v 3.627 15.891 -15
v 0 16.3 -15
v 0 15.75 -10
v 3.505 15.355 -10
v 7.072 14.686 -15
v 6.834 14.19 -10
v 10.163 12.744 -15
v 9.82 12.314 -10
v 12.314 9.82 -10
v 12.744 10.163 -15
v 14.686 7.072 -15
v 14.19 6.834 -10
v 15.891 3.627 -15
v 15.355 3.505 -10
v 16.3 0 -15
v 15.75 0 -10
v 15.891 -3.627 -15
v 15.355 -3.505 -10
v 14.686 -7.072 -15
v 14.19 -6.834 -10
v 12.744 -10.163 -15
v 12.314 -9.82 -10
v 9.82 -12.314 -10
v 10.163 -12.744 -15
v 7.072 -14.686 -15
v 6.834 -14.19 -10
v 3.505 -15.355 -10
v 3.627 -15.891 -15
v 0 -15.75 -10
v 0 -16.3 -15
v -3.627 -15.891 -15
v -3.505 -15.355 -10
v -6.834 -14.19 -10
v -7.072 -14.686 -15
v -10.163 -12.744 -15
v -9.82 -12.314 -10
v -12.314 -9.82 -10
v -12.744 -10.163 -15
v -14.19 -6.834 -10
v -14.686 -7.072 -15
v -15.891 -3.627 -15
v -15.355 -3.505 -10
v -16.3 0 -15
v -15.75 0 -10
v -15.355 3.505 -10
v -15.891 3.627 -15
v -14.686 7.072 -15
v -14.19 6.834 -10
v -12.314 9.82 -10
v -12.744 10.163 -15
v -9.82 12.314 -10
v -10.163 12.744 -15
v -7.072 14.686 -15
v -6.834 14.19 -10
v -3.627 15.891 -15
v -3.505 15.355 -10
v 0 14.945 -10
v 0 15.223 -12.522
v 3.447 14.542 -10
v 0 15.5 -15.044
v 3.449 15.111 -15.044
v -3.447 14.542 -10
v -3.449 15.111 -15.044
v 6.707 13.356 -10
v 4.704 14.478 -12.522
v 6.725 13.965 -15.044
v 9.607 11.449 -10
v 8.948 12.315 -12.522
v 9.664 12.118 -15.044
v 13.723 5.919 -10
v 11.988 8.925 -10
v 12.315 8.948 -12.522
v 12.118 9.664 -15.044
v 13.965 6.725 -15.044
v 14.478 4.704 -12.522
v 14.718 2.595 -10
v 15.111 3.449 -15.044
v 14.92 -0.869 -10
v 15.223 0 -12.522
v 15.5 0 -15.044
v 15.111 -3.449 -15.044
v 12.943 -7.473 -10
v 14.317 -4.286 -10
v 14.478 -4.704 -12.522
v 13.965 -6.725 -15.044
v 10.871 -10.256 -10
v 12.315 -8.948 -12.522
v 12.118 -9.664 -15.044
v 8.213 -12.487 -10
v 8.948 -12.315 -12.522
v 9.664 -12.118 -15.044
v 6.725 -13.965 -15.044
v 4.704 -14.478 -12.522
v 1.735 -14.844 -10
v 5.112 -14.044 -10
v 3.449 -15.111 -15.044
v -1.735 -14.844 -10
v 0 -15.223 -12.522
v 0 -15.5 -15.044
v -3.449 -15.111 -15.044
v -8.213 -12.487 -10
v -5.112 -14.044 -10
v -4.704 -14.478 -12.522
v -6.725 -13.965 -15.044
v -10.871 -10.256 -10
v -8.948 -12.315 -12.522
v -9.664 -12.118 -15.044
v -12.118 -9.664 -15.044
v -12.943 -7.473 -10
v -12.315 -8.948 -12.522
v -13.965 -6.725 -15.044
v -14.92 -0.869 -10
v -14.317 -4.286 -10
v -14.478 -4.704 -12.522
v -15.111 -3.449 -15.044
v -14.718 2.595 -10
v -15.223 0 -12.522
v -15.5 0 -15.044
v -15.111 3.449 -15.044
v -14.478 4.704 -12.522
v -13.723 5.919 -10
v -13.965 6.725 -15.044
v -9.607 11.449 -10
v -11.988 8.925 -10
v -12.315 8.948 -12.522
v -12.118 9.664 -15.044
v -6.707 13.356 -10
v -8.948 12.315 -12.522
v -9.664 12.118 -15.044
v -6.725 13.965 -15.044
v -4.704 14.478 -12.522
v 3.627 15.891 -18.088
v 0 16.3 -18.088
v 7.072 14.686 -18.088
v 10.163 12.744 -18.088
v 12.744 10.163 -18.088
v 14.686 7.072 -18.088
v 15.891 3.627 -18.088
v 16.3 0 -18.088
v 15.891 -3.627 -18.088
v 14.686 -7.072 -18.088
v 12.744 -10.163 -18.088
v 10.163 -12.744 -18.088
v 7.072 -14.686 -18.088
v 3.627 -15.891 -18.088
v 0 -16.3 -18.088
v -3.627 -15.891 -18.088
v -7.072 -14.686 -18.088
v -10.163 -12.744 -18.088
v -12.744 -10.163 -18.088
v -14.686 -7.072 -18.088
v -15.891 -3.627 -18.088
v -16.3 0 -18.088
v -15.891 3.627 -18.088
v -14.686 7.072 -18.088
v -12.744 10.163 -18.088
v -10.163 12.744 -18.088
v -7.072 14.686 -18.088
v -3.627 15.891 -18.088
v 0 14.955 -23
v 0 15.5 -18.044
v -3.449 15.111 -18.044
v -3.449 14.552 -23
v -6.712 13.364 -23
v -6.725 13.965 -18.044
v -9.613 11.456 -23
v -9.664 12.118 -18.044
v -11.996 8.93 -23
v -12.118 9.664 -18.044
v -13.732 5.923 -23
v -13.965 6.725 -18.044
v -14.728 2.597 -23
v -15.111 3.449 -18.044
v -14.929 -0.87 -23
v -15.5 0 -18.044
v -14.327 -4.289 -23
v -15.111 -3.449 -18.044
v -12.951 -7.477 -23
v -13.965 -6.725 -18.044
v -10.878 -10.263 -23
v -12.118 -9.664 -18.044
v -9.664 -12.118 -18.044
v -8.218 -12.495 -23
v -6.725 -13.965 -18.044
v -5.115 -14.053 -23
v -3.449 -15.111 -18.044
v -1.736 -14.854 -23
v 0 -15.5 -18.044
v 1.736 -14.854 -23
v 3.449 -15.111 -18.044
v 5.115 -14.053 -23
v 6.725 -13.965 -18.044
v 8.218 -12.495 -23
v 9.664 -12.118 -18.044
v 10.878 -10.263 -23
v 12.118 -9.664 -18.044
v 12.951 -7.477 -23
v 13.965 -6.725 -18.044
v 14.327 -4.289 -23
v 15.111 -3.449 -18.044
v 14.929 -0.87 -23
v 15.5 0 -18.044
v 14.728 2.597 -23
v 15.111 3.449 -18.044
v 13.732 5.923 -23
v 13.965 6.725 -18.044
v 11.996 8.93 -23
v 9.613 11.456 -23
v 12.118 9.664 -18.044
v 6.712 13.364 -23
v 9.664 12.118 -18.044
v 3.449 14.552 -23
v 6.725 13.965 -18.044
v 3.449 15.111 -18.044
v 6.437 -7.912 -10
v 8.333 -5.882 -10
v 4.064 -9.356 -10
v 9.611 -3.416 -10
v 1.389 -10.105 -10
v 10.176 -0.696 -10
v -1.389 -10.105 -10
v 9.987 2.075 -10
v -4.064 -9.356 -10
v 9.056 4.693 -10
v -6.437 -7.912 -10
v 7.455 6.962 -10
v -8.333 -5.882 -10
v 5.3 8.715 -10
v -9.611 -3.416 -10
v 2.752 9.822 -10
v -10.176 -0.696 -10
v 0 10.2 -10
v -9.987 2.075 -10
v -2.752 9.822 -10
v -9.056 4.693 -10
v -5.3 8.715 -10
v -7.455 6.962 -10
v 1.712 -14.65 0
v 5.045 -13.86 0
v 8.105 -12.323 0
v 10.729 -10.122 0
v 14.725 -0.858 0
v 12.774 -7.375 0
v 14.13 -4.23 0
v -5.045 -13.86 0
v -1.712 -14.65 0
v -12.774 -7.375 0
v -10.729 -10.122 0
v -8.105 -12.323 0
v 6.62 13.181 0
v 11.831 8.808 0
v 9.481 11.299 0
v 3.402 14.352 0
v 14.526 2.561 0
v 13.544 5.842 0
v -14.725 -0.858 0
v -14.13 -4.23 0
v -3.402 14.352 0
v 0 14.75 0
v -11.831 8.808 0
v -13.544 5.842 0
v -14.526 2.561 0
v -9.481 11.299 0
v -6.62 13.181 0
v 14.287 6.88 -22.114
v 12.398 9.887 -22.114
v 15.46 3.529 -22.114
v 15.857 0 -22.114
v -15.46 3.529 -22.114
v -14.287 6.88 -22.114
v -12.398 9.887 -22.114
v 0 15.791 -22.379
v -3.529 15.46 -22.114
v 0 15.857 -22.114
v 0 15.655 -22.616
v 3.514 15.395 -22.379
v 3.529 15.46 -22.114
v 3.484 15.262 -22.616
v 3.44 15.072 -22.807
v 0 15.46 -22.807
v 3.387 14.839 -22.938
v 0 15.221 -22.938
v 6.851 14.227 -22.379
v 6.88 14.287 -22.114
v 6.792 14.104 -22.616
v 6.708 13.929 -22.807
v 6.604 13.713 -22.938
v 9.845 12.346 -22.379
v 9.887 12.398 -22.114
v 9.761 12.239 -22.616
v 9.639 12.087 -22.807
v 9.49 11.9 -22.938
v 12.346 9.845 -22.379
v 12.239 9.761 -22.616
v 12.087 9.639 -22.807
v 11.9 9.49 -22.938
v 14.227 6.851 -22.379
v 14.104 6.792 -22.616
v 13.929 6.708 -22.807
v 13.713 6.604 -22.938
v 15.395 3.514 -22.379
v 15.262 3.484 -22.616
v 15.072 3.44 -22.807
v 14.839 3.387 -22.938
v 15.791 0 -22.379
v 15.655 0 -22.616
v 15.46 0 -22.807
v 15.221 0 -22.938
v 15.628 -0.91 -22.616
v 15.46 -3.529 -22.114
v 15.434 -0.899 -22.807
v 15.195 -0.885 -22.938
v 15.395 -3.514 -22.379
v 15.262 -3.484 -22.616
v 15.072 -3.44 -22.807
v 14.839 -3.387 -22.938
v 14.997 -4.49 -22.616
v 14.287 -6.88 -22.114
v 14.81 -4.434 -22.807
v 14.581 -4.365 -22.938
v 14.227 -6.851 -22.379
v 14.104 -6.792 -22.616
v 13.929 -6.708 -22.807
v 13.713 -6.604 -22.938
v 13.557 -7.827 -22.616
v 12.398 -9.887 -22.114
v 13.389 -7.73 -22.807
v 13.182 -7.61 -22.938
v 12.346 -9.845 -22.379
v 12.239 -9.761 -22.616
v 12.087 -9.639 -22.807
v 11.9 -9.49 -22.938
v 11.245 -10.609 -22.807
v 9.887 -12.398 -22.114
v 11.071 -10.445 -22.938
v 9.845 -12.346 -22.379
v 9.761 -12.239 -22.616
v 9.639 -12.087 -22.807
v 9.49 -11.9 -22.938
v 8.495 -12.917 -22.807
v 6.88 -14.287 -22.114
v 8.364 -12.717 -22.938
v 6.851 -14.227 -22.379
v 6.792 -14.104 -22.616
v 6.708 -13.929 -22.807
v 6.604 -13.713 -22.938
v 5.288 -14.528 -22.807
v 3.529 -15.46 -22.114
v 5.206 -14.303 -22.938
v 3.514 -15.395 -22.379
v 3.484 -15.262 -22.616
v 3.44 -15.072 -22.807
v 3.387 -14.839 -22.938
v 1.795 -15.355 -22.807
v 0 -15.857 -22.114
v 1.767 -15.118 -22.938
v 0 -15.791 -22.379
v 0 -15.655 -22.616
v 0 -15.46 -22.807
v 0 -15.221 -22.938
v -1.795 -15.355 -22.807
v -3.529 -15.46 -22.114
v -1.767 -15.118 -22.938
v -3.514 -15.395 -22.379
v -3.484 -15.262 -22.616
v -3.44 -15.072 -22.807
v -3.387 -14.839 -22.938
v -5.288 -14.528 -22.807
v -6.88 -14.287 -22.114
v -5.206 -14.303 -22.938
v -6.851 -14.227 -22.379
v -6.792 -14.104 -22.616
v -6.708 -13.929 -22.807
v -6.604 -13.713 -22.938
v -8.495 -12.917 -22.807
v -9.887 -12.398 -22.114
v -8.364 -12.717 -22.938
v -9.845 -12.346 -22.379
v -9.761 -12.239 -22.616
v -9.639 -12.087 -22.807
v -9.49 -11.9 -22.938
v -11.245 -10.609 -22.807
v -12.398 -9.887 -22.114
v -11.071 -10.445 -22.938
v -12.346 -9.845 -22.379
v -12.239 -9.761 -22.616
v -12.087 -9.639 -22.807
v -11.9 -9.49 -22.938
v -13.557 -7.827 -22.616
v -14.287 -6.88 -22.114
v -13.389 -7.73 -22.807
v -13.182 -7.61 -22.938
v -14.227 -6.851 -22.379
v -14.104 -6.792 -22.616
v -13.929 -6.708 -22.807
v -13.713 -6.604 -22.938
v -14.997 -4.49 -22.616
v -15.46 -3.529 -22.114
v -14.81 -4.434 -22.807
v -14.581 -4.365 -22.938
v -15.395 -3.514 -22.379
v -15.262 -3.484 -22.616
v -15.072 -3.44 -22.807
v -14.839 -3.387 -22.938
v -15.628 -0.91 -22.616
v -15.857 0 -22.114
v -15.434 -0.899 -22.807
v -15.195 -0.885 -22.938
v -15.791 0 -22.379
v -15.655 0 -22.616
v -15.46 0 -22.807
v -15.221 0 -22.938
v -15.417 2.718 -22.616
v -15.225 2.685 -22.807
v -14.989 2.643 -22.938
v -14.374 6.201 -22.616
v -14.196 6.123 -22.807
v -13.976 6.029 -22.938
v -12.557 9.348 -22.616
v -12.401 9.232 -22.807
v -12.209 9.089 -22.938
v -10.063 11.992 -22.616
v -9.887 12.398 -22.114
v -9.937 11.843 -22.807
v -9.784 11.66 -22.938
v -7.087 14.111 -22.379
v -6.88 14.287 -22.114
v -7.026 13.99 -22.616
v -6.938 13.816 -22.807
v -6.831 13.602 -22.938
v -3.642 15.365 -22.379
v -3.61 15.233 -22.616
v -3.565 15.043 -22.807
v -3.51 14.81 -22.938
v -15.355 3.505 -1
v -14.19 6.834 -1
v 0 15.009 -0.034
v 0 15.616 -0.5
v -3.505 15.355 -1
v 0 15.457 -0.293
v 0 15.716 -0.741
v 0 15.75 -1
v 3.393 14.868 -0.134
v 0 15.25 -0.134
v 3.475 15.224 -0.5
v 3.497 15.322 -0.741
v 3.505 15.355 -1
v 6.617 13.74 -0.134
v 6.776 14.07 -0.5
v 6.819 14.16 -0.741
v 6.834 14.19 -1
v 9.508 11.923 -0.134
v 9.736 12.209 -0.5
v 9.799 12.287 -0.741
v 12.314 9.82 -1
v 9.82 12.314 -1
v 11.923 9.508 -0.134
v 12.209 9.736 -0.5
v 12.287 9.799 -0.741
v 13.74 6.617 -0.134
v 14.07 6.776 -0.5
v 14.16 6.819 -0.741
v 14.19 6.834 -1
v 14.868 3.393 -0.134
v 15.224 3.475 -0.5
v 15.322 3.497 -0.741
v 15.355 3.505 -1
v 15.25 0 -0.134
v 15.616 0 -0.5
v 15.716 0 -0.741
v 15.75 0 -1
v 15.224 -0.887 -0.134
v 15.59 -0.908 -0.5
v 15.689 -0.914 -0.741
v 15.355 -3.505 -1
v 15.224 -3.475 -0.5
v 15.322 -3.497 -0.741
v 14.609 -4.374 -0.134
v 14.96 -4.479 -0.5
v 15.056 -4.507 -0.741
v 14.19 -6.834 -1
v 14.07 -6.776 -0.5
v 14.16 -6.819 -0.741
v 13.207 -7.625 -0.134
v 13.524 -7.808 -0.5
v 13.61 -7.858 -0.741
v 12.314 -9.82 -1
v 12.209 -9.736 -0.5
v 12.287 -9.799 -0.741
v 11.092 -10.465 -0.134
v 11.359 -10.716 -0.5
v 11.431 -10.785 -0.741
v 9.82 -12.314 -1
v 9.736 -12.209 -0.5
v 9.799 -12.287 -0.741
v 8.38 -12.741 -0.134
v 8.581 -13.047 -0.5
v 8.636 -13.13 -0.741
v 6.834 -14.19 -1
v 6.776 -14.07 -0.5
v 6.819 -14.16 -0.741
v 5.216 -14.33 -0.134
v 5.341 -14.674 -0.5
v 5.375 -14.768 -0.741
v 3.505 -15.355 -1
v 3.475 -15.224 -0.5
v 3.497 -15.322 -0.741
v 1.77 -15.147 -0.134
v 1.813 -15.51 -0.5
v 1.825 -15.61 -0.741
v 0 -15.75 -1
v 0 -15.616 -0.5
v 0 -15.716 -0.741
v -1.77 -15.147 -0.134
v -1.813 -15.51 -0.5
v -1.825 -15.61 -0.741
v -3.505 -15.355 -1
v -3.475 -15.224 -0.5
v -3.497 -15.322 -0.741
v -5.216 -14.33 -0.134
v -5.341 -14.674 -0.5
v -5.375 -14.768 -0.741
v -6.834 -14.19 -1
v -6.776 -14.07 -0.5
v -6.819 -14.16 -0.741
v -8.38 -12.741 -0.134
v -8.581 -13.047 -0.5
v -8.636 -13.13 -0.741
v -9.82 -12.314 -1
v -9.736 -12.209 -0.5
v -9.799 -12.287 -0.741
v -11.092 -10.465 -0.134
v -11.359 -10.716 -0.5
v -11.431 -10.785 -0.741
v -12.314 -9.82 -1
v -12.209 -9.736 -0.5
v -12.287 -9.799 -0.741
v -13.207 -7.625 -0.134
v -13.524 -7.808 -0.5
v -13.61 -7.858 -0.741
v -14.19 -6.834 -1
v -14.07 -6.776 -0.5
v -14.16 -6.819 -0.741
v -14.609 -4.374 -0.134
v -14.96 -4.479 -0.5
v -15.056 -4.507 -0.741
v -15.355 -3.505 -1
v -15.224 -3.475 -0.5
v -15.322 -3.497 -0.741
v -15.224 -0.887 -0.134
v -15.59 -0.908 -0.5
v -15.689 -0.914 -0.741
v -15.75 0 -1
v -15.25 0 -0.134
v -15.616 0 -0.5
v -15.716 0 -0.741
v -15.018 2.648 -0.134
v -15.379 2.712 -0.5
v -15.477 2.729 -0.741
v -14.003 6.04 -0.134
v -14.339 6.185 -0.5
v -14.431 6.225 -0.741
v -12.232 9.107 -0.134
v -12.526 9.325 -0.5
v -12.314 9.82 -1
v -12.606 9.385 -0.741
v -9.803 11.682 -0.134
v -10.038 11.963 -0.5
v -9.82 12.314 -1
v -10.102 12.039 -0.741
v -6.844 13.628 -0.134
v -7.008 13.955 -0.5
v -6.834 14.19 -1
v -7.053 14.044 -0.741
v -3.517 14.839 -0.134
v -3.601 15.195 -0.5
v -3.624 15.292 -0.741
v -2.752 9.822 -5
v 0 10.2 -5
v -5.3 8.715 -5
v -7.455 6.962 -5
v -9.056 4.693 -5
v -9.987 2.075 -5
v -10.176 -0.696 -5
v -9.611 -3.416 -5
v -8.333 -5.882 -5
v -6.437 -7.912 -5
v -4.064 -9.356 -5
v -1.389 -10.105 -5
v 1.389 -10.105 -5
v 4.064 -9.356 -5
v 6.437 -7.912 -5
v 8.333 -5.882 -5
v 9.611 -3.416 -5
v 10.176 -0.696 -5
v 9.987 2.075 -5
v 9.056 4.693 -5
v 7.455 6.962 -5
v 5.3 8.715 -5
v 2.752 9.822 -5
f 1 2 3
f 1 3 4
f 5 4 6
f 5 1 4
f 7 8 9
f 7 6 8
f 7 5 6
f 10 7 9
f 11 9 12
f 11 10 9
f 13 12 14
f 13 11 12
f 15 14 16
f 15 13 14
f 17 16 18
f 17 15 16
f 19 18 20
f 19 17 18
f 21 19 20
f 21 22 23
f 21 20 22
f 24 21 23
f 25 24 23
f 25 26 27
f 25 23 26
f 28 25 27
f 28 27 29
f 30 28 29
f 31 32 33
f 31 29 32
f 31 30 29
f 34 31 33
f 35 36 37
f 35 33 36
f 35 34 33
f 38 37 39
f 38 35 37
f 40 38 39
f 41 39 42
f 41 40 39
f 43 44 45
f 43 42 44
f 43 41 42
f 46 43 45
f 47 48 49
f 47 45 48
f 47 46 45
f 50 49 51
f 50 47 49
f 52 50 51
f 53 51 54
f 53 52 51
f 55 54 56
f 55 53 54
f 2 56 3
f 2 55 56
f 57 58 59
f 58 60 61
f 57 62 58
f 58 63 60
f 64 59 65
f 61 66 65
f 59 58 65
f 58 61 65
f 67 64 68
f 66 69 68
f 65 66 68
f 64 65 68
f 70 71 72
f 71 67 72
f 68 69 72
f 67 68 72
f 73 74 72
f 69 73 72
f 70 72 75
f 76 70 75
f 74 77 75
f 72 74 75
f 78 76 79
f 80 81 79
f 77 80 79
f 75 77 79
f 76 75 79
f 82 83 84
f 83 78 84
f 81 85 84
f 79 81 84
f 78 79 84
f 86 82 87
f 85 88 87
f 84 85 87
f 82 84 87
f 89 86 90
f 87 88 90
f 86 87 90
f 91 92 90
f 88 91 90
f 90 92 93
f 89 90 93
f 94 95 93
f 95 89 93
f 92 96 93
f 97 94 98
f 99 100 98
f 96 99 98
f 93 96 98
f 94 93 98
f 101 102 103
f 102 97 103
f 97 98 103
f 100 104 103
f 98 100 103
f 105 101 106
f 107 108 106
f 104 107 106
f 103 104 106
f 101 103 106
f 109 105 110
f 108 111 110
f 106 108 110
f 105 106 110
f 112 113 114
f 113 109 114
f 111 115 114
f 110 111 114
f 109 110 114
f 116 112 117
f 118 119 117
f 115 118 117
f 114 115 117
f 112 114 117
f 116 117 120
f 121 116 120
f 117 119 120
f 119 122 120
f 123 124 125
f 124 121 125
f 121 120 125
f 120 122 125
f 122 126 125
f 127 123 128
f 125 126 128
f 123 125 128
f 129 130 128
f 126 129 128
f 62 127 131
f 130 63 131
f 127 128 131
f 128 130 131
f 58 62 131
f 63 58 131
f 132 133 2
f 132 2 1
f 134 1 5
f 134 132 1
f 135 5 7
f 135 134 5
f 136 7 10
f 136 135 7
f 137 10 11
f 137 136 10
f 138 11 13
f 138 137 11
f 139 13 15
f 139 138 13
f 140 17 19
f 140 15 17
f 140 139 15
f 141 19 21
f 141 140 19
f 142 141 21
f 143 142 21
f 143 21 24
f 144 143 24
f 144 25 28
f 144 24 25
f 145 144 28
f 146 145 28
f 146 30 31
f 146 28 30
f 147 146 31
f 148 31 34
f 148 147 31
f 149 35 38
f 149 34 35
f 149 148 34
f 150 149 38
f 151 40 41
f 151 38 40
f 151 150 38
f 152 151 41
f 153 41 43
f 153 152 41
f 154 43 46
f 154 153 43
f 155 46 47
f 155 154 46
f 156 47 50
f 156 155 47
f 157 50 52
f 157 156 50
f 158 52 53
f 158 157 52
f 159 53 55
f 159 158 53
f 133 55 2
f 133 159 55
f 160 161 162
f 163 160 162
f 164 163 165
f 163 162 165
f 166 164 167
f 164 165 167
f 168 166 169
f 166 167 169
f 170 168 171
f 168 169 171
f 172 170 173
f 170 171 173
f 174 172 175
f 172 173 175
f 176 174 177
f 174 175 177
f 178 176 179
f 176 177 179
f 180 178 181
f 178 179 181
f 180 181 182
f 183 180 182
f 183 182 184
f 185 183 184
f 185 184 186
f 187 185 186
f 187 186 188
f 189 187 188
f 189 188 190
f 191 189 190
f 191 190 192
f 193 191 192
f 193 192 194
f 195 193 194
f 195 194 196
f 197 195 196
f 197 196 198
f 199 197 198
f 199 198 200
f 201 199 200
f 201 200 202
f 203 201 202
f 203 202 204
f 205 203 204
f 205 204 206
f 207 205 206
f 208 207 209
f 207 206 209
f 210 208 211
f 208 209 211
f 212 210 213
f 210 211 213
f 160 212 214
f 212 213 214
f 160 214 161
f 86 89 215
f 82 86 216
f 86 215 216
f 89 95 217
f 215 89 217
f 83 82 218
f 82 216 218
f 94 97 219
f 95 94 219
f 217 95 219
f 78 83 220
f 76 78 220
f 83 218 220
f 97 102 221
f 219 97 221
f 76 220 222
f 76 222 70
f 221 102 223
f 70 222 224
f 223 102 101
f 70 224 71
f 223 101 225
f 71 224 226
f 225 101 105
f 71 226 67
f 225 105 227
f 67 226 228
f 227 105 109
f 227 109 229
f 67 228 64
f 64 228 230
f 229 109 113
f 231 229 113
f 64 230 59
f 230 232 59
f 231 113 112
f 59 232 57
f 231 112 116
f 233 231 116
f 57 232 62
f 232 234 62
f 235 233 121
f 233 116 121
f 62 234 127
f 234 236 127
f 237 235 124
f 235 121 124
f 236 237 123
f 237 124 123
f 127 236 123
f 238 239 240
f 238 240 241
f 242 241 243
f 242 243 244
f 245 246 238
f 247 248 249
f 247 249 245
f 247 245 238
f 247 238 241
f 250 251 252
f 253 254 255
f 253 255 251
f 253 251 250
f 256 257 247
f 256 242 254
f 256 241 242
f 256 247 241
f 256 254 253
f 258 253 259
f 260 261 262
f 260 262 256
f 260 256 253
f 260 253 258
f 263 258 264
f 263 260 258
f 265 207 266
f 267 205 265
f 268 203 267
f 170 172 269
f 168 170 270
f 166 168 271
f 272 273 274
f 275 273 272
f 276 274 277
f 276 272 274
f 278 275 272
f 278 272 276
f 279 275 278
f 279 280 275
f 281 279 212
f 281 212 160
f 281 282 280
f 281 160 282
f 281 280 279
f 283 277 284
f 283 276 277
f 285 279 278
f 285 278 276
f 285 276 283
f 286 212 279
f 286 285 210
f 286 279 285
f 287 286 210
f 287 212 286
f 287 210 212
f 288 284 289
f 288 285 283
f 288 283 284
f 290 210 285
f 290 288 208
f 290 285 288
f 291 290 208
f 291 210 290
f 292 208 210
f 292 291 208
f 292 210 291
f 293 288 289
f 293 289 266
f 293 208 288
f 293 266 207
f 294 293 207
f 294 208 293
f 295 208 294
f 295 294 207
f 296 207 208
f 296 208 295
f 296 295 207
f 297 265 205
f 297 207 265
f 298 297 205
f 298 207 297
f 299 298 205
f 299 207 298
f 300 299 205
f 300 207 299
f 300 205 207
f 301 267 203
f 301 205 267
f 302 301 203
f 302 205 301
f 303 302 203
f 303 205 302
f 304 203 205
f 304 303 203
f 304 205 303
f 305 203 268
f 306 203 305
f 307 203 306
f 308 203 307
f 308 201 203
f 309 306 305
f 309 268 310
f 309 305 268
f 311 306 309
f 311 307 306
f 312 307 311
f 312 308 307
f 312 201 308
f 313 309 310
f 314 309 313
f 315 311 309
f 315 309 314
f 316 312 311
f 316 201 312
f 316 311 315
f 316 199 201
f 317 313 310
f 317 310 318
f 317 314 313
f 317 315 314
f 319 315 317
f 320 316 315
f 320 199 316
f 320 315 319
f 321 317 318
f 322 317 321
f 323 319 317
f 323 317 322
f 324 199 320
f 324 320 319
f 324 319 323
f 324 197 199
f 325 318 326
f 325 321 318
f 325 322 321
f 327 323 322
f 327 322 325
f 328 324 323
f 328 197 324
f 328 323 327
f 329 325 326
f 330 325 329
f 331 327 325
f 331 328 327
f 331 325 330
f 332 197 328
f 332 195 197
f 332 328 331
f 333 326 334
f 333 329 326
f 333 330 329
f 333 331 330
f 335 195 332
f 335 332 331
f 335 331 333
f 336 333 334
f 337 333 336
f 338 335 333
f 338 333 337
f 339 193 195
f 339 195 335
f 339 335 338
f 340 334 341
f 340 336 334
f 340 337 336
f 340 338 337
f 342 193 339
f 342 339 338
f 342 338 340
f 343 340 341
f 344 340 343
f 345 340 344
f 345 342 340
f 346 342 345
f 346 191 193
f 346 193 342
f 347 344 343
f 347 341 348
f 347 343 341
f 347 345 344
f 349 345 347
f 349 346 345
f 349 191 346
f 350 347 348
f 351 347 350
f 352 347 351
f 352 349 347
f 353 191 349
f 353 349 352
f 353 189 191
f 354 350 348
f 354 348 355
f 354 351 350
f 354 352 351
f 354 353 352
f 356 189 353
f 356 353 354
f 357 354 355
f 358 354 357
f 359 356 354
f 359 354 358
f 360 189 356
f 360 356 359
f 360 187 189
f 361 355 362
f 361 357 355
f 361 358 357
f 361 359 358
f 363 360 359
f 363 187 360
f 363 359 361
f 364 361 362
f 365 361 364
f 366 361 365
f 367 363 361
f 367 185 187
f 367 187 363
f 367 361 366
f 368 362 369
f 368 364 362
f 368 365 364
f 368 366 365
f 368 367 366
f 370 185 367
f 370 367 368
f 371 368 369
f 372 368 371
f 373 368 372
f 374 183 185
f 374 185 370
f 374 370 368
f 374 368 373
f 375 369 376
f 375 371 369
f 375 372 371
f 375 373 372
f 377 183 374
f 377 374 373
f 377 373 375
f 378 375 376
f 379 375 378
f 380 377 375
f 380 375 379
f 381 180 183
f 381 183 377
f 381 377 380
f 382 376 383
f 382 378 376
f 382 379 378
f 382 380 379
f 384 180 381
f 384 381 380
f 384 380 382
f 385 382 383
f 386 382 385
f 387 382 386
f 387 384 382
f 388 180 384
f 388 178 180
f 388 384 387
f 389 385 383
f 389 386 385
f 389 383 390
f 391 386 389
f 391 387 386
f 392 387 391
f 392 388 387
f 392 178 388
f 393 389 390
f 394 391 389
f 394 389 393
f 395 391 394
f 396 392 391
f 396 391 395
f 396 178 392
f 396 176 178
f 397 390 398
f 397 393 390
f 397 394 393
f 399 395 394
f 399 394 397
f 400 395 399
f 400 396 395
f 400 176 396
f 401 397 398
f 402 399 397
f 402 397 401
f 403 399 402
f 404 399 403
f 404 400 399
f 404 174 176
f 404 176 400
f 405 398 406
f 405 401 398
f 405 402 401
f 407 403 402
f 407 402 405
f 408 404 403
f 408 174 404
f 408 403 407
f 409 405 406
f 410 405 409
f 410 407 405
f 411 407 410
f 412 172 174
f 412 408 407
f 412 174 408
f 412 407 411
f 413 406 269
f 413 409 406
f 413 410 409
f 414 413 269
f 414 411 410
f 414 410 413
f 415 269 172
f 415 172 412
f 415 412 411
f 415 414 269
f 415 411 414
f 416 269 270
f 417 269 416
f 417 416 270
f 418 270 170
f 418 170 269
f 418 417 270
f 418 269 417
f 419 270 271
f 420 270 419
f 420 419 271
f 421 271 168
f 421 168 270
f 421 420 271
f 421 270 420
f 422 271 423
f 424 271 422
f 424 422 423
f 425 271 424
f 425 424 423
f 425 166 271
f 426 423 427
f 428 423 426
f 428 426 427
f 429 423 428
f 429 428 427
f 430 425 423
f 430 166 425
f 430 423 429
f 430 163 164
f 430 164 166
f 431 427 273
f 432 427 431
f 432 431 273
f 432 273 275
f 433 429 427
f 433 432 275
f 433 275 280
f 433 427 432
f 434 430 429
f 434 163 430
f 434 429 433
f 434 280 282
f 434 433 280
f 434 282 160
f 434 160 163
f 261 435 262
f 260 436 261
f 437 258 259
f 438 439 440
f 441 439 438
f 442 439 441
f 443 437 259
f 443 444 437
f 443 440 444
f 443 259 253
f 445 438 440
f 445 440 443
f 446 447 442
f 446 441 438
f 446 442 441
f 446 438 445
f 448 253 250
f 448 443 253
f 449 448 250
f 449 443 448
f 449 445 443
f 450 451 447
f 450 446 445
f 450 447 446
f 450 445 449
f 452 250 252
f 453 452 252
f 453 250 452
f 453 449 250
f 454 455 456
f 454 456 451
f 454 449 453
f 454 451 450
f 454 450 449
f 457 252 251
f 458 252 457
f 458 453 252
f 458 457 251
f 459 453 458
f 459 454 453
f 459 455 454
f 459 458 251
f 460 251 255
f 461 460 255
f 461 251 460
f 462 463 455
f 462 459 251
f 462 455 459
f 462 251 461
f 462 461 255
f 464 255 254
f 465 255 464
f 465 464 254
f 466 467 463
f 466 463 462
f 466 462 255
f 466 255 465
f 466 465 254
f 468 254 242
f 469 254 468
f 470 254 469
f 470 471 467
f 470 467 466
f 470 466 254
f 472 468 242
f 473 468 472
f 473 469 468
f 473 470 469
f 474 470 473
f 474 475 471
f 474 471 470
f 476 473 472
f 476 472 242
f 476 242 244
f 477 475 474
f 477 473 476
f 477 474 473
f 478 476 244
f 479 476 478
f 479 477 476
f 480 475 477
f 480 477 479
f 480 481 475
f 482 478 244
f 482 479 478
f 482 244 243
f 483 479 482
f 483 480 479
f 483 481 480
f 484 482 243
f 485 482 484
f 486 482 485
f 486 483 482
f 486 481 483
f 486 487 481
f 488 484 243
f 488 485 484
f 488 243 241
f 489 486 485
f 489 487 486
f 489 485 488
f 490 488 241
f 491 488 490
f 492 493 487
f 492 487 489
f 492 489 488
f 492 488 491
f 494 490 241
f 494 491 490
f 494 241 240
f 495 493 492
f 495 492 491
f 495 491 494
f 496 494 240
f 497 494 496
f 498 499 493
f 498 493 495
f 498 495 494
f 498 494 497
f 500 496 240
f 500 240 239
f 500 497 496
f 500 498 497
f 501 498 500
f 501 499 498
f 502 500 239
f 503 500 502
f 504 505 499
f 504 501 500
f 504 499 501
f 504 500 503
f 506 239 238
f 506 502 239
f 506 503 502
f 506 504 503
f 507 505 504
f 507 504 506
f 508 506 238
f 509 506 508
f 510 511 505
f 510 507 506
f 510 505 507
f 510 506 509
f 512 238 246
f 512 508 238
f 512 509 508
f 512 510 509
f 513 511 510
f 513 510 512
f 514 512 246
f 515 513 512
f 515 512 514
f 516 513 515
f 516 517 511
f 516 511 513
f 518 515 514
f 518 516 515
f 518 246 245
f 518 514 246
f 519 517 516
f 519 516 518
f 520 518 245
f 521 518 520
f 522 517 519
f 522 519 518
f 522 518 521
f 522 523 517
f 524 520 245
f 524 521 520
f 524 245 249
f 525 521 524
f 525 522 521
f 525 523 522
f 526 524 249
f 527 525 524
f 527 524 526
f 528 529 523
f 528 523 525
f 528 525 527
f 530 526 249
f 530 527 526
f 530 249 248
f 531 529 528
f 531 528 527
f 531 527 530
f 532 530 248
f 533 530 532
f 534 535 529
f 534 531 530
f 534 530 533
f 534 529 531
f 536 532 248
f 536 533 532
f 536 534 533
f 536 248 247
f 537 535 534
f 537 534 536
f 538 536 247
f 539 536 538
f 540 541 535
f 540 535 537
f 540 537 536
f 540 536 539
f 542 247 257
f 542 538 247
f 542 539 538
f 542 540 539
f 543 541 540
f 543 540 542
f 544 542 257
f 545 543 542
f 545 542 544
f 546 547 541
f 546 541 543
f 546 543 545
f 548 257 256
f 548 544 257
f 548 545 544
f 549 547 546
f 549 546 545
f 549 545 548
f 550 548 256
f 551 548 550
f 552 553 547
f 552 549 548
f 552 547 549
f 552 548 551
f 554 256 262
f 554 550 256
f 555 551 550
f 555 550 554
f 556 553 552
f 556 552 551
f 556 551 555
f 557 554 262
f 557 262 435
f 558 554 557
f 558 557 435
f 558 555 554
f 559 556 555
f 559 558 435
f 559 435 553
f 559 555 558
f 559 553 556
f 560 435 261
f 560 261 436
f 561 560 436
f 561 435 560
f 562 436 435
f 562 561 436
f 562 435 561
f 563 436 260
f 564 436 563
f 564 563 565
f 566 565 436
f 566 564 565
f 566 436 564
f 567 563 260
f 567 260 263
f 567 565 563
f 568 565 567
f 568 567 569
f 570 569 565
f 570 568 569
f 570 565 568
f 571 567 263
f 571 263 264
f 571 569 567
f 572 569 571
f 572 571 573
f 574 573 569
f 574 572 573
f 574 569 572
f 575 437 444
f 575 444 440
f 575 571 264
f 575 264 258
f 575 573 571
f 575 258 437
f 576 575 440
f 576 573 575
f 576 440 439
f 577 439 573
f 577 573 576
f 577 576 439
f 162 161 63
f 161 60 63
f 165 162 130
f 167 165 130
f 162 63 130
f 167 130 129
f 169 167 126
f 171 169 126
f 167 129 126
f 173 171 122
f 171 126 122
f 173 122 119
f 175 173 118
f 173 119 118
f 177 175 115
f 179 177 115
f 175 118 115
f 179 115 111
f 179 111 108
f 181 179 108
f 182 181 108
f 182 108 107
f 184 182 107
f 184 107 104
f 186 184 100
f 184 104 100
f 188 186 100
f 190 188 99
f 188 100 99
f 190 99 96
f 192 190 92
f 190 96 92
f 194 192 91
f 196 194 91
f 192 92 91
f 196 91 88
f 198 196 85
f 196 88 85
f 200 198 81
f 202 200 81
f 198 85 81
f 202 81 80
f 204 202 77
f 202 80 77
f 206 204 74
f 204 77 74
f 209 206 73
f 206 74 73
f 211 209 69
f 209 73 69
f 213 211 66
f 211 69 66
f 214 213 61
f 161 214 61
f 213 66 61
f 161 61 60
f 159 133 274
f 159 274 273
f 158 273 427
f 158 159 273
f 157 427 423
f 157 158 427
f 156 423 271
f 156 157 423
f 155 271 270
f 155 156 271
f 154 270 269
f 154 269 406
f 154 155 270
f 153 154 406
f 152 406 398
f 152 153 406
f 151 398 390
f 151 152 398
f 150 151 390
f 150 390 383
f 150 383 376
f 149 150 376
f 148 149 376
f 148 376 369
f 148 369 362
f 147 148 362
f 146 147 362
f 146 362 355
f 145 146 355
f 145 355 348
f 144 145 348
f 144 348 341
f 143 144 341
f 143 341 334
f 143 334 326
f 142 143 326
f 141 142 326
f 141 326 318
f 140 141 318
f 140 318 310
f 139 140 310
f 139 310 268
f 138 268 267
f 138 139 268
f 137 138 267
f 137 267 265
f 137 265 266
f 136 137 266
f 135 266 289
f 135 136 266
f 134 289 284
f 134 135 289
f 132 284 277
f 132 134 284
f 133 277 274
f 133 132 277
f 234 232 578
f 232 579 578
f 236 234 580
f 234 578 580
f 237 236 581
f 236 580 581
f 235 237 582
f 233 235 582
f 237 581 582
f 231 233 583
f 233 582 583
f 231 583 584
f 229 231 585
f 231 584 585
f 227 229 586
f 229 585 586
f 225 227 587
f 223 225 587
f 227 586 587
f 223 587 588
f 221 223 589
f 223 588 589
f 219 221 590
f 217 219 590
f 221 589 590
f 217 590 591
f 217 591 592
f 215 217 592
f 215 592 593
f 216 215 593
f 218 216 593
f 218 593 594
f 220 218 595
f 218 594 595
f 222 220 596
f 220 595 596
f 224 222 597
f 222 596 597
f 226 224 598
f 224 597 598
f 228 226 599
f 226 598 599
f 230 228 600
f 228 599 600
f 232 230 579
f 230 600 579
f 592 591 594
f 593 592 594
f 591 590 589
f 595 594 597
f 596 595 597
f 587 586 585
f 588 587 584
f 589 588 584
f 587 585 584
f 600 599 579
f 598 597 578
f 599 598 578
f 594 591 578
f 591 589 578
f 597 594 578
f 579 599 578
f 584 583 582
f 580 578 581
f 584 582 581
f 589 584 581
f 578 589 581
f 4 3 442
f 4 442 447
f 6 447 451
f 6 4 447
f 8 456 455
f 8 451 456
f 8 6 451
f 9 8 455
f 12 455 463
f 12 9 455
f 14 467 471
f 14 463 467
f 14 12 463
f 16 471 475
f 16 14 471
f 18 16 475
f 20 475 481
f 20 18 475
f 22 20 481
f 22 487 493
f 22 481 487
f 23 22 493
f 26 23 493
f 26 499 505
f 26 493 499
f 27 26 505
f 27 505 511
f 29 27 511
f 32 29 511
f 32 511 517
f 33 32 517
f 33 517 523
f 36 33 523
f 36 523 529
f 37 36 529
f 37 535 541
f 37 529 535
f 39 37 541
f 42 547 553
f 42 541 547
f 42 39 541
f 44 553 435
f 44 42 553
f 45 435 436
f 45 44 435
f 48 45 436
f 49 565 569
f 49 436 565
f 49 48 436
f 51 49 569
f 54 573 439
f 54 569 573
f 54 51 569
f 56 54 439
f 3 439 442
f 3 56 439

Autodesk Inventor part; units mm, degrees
ref_plane "YZ Plane" through (0, 0, 0) normal (1, 0, 0) x (0, 1, 0)
ref_plane "XZ Plane" through (0, 0, 0) normal (0, 1, 0) x (-1, 0, 0)
ref_plane "XY Plane" through (0, 0, 0) normal (0, 0, 1) x (1, 0, 0)
sketch "Sketch1" plane through (0, 0, 0) normal (1, 0, 0) x (0, 1, 0)
  line L0 (0, 0) -> (15.75, 0)
  line L1 (15.75, 0) -> (15.75, -10)
  line L2 (15.75, -10) -> (10.2, -10)
  line L3 (10.2, -10) -> (10.2, -5)
  line L4 (10.2, -5) -> (0, -5)
  line L5 (0, -5) -> (0, 0)
  point P0 (0, -2.5)
  point P1 (15.75, -5)
  point P2 (7.875, 0)
  dimension "d0" = 15.75
  dimension "d1" = 10.2
  dimension "d2" = 10
  dimension "d3" = 5
revolve "Revolution1" add sketch "Sketch1" angle 360 about axis through (0, 0, -5) along (0, 0, 1)
sketch "Sketch3" plane through (0, 0, 0) normal (1, 0, 0) x (0, 1, 0)
  line L0 (15.75, 0) -> (-15.75, 0) projected
  line L1 (15.75, -10) -> (-15.75, -10) projected
  line L2 (15.75, -10) -> (15.75, 0) projected
  line L3 (15.75, -10) -> (16.3, -15)
  line L4 (15.5, -15.0439) -> (14.9452, -10)
  line L5 (14.9452, -10) -> (15.75, -10)
  line L6 (0, -24.0479) -> (0, 4.008) projected
  line L7 (16.3, -15) -> (16.3, -18.0877)
  line L8 (15.5, -18.0439) -> (15.5, -15.0439)
  line L9 (15.5, -18.0439) -> (14.9548, -23.0003)
  line L10 (14.9548, -23.0003) -> (15.75, -23.0877)
  line L11 (15.75, -23.0877) -> (16.3, -18.0877)
  point P0 (0, 0)
  point P1 (0, 0)
  point P2 (15.2274, -20.5221)
  dimension "d14" = 0.8
  dimension "d15" = 16.3
  dimension "d16" = 5
  dimension "d19" = 0.8
  dimension "d21" = 3
  dimension "d22" = 5
  dimension "d25" = 0.8
revolve "Revolution2" add sketch "Sketch3" angle 360 about axis through (0, 0, -10) along (0, 0, 1) contours L3 L7 L11 L10 L9 L8 L4 L1
fillet "Fillet2" radius 1 2 edges at (0, -15.75, 0) (0, -15.75, -23.0877)
properties part number "Spring_Top_3DPrint"
